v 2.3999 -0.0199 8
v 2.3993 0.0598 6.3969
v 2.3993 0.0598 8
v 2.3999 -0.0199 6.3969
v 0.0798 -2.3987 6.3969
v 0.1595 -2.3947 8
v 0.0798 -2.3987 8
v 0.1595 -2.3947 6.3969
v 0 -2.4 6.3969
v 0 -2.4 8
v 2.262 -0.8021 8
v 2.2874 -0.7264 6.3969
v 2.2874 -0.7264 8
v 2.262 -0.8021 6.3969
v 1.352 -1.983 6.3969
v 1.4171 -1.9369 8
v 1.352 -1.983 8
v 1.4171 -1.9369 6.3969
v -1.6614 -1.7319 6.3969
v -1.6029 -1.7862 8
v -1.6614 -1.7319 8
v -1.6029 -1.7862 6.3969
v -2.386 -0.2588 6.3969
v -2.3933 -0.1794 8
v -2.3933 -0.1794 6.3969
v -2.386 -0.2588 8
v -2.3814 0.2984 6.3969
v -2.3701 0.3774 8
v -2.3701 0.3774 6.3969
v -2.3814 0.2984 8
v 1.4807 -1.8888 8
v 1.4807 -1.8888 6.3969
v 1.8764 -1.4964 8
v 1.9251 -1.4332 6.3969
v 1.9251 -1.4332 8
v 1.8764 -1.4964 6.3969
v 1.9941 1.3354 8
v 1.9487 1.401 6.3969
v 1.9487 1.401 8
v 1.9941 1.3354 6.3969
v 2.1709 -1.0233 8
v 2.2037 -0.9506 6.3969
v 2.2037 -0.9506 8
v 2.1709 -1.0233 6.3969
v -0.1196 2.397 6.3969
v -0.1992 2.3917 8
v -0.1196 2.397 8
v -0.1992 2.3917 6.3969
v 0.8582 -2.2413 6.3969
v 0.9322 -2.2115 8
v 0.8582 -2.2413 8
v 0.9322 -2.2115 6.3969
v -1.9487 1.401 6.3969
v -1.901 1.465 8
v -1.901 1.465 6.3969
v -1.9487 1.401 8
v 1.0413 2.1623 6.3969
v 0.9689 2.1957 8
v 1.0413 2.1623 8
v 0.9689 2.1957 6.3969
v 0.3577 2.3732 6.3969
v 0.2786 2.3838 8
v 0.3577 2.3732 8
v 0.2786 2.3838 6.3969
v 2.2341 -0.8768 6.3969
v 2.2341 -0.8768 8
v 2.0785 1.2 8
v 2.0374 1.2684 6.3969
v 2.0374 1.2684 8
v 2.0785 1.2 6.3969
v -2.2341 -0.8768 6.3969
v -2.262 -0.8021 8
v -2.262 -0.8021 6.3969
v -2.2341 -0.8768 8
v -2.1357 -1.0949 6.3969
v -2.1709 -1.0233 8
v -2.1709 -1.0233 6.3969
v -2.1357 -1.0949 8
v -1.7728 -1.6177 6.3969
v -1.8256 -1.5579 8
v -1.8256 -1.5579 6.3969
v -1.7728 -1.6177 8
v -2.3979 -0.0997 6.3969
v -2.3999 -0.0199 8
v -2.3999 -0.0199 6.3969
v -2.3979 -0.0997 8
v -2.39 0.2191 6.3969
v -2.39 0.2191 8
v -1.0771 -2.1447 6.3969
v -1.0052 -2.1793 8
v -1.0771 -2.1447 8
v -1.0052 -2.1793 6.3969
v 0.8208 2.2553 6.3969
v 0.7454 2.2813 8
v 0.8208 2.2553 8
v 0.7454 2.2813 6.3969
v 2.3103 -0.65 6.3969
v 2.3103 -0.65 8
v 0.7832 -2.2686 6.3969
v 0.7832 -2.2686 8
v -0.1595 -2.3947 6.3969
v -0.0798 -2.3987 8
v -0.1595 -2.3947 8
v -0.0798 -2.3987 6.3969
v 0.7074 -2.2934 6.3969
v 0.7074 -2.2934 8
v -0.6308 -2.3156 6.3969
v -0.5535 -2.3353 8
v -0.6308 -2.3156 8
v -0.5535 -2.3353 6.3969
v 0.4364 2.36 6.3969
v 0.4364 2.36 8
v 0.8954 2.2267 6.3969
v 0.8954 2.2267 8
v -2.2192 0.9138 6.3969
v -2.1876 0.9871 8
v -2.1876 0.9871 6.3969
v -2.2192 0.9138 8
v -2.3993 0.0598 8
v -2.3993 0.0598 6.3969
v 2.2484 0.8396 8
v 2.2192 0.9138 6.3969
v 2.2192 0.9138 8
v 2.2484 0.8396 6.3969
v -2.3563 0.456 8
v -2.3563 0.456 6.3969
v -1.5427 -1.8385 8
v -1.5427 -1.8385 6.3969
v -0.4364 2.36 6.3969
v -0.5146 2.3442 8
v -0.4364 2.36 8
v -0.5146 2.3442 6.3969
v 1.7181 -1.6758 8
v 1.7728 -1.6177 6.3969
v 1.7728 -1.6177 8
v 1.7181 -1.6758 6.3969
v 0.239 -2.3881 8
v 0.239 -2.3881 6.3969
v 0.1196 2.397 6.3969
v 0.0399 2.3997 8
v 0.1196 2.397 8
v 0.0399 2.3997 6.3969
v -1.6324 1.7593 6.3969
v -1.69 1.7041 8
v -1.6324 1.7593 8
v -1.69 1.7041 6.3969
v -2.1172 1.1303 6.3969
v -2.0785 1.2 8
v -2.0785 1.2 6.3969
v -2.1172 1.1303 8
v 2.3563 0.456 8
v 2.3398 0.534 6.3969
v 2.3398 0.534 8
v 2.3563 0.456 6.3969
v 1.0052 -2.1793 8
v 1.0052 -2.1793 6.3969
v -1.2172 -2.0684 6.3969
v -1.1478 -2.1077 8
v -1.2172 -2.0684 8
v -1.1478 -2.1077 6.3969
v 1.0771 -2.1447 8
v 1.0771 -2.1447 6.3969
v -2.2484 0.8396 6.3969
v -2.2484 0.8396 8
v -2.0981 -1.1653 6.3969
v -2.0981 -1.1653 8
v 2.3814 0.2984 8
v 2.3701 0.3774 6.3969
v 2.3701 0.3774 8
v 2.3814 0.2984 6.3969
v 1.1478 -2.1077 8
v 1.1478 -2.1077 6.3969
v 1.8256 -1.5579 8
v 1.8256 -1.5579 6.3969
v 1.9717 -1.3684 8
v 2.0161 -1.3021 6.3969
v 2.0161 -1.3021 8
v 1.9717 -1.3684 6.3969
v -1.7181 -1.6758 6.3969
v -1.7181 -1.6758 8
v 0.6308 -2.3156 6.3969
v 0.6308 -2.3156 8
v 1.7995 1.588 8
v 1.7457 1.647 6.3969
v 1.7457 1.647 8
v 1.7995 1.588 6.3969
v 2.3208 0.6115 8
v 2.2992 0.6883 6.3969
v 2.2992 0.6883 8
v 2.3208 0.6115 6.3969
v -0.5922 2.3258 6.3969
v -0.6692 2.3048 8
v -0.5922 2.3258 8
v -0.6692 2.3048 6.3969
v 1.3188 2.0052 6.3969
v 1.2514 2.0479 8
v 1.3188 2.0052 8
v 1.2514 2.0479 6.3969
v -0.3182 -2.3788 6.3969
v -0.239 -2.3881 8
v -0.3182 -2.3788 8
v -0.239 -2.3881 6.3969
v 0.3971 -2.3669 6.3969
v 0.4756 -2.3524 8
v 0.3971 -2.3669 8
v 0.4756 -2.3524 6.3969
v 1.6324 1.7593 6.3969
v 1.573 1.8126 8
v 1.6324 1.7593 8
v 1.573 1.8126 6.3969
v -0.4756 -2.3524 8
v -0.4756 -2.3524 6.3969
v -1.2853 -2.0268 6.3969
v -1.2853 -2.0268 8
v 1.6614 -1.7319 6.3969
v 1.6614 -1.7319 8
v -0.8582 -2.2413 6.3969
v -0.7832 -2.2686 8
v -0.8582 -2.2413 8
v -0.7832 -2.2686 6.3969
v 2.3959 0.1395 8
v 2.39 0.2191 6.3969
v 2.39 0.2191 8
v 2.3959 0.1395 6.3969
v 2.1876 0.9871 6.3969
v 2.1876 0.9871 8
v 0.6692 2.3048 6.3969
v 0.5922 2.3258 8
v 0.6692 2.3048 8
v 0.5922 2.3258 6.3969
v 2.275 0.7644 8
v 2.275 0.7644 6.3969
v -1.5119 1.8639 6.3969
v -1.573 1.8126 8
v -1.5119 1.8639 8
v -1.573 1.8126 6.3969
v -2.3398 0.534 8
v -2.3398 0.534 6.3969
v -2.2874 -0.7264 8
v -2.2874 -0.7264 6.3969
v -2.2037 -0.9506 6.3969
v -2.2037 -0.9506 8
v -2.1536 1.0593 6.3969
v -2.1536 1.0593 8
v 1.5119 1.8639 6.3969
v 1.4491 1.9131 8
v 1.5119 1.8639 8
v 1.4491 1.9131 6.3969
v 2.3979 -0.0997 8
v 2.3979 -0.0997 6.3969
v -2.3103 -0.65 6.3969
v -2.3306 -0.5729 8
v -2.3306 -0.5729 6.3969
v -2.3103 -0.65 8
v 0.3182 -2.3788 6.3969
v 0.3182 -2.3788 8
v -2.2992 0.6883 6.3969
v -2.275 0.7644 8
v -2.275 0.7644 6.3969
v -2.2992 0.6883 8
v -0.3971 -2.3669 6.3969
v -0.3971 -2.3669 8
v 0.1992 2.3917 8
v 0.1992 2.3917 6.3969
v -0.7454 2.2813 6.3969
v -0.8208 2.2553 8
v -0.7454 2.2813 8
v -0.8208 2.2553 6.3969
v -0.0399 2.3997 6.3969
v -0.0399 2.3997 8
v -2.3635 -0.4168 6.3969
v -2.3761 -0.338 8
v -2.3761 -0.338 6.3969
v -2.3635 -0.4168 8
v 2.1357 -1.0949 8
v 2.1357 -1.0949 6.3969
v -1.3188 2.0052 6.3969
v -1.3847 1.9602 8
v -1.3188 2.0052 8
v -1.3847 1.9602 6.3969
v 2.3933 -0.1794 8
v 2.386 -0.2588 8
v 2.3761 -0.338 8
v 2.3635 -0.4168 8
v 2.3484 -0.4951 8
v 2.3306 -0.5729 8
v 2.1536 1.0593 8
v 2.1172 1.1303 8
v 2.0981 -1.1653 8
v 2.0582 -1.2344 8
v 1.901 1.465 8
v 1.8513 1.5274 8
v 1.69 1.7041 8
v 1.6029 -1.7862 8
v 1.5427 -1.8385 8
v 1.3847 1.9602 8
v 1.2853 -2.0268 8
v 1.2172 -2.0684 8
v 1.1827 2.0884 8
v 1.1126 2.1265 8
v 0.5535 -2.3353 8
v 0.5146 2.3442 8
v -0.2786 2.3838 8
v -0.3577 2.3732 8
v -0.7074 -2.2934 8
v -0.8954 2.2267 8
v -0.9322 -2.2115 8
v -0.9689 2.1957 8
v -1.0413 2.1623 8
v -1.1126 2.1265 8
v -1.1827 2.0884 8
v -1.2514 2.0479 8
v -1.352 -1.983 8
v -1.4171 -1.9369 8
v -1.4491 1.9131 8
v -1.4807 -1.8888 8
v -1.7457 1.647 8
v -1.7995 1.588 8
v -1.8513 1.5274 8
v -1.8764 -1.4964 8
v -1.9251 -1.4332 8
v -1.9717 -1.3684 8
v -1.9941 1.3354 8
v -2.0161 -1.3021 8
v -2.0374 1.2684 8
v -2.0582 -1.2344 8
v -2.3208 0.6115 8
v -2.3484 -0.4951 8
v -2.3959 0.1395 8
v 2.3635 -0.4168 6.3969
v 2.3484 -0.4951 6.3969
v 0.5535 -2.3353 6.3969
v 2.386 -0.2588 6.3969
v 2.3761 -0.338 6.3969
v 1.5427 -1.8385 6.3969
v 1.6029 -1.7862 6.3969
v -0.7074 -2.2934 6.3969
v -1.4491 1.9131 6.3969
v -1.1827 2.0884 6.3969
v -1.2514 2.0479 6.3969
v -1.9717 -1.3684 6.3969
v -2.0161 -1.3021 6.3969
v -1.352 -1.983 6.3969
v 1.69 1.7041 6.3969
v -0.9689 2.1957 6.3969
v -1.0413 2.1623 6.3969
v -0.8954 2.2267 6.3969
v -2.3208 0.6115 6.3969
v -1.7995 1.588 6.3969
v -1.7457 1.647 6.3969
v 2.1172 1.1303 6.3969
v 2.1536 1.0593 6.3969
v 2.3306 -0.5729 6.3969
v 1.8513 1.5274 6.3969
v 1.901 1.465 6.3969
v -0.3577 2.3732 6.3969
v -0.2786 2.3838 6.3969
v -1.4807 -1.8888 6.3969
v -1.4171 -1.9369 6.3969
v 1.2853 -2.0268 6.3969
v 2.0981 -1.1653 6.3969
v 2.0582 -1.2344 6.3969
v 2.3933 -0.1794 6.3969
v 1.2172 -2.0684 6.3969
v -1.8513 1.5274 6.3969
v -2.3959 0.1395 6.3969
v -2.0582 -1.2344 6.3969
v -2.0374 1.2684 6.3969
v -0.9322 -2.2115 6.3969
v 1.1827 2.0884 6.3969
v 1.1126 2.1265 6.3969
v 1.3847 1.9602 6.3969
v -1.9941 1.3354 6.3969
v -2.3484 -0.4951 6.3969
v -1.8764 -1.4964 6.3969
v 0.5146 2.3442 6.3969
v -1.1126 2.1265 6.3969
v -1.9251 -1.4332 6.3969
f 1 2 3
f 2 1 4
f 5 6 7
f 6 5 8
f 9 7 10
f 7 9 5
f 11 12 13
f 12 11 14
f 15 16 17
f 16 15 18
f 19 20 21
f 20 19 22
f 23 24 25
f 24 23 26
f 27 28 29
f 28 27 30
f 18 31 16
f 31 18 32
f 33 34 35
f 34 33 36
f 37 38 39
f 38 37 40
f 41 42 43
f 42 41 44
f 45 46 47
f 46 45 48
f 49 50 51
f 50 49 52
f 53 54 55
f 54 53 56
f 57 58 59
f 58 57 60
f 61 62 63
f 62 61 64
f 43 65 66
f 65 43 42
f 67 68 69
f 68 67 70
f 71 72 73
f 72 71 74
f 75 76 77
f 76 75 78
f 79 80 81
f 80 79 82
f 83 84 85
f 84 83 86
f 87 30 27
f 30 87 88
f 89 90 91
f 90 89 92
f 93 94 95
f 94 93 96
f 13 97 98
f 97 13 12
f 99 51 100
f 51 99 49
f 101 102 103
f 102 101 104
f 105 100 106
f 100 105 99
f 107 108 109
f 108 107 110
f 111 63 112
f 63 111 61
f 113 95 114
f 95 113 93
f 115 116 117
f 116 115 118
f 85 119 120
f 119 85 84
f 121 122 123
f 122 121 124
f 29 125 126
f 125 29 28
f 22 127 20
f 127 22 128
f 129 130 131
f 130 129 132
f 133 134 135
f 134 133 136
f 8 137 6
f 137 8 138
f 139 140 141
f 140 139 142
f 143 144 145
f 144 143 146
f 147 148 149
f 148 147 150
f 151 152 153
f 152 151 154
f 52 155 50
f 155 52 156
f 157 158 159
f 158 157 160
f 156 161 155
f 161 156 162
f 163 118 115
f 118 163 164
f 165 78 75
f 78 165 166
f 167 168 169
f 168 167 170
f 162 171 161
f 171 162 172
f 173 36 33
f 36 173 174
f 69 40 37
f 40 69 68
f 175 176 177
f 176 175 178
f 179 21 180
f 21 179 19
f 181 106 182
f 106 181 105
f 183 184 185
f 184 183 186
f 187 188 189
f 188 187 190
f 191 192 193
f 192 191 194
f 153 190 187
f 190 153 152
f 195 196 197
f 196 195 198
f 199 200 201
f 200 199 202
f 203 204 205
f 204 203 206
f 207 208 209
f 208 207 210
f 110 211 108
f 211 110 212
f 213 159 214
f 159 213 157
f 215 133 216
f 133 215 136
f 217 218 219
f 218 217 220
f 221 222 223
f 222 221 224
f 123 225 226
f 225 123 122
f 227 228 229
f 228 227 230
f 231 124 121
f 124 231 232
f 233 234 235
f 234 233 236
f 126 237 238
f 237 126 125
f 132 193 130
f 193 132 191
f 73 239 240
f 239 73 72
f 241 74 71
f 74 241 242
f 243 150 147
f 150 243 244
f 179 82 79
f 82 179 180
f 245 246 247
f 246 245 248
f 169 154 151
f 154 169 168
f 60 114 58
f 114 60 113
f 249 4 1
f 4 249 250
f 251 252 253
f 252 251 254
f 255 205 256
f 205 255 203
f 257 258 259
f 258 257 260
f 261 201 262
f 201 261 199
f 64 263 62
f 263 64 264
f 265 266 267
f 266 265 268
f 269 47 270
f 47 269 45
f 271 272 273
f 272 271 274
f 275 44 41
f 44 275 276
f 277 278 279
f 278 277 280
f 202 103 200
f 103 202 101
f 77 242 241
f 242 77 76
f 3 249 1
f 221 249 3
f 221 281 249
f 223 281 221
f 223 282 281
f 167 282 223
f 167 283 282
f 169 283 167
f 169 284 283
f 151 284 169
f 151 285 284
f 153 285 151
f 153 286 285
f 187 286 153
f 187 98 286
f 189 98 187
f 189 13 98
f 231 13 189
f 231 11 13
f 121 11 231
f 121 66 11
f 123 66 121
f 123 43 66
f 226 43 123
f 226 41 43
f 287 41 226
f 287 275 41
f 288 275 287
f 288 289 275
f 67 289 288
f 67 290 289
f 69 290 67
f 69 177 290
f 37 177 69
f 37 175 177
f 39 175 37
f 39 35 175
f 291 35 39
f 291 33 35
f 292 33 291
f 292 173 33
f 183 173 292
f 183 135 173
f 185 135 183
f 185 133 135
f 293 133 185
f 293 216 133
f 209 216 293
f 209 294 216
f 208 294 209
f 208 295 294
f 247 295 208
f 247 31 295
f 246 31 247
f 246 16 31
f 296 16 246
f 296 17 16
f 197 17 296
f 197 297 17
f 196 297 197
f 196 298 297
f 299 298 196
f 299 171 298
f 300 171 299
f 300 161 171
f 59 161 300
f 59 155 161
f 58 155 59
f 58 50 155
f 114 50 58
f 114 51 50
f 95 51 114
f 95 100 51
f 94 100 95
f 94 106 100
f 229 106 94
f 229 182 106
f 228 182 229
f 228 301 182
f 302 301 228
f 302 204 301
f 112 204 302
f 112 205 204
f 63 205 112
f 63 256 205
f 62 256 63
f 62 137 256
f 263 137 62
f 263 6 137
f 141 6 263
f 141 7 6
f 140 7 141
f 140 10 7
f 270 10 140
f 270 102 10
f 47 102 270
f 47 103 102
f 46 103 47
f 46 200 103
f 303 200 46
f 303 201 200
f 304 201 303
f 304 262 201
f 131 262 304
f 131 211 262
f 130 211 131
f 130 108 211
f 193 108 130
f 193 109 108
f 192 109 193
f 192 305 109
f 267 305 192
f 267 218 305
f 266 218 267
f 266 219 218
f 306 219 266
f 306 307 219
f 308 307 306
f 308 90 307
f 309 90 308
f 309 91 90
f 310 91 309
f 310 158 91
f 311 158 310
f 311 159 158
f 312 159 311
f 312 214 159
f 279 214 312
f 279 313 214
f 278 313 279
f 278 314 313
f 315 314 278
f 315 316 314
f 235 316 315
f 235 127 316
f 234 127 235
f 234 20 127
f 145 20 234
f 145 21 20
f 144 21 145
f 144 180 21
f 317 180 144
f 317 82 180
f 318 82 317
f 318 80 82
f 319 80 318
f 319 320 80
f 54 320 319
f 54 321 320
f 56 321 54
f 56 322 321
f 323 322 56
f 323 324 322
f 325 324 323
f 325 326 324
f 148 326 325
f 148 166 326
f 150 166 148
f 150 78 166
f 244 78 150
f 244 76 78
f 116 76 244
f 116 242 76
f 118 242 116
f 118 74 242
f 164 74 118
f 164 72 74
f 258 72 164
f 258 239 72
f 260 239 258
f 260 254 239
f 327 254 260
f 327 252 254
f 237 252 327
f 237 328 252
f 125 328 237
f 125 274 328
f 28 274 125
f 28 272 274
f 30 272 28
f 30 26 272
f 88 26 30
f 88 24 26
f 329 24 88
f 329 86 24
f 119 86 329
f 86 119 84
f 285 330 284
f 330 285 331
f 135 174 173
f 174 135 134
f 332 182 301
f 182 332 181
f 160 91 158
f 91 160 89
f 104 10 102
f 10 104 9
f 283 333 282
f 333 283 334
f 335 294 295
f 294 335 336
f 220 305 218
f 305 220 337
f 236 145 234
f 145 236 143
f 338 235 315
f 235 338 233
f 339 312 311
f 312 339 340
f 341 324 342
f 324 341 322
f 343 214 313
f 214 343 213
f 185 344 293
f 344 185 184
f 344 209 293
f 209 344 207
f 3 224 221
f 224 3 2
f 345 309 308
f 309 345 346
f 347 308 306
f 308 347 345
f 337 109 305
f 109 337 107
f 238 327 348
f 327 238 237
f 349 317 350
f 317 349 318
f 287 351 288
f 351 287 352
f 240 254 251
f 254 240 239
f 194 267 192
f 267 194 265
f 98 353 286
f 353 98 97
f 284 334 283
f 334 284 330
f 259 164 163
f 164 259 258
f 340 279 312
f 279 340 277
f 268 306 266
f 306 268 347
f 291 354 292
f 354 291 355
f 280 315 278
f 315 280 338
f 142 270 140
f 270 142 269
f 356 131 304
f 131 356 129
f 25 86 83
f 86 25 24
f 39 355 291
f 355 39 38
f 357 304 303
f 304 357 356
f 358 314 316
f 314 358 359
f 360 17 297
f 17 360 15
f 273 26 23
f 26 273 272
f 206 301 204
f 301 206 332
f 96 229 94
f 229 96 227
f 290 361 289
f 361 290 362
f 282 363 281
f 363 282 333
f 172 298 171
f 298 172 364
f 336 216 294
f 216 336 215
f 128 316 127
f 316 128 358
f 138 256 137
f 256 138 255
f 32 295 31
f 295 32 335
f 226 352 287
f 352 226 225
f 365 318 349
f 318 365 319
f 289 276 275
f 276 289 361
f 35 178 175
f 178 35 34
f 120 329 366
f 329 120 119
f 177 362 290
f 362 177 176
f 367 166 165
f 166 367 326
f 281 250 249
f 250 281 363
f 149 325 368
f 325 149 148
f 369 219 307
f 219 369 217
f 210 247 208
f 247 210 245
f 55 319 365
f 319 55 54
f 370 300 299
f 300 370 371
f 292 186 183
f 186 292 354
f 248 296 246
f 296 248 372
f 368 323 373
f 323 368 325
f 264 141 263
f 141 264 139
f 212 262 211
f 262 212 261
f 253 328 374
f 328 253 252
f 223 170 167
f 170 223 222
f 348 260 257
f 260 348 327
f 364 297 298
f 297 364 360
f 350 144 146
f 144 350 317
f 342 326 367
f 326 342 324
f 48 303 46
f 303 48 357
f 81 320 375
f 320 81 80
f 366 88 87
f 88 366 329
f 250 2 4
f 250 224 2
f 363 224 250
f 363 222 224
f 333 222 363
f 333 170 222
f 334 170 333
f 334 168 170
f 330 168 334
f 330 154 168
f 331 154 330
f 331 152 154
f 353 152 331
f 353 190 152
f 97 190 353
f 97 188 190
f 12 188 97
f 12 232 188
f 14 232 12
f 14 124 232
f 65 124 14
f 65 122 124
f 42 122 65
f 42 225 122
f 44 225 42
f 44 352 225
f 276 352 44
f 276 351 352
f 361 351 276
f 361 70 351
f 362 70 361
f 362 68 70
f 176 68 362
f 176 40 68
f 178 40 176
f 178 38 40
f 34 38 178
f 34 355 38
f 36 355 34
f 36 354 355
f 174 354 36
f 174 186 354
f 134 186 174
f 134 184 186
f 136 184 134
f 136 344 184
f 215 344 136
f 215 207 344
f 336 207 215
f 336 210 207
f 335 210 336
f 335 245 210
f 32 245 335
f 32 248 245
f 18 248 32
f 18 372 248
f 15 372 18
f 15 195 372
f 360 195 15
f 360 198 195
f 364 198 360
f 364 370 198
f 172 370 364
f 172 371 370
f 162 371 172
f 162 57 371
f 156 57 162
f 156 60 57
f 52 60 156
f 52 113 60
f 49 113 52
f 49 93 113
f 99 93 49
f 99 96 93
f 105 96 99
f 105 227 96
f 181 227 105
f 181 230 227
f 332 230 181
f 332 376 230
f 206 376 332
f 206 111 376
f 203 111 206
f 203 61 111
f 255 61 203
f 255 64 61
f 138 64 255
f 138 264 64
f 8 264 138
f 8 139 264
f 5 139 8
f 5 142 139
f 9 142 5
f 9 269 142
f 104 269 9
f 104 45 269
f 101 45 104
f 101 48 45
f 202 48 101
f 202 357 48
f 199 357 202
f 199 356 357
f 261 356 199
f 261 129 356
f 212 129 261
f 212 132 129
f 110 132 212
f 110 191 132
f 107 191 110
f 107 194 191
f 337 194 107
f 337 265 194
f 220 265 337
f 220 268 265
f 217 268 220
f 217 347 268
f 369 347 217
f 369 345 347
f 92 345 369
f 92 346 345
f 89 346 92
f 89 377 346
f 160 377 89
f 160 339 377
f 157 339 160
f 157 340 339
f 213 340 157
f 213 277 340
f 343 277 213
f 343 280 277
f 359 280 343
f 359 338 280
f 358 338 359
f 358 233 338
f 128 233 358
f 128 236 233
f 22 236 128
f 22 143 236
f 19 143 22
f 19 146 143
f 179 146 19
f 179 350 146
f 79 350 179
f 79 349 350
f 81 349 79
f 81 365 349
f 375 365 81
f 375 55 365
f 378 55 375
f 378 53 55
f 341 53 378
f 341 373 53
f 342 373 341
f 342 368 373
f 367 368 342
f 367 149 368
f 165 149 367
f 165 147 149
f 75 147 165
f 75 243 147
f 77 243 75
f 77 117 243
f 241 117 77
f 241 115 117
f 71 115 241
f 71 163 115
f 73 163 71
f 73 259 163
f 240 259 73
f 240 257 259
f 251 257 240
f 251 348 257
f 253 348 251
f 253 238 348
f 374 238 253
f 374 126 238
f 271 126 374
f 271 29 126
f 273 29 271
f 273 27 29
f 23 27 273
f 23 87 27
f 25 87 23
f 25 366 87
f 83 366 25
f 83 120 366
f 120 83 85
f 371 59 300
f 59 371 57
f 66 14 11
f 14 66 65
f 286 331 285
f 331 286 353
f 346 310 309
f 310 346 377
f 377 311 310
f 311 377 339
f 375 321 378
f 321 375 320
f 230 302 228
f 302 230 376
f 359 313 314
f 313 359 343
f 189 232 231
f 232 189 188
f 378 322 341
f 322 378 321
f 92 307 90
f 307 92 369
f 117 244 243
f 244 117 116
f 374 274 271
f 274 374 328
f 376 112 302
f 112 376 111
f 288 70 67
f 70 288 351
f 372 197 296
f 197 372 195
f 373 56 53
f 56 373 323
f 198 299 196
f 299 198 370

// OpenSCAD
use <../lib.scad>
use <3741c01.scad>
$fa=1; $fs=0.2;
function ldraw_lib__flowers(realsolid=false) = [
// 0 ~Moved to 3741c01
// 0 Name: flowers.dat
// 0 Author: [PTadmin]
// 0 !LDRAW_ORG Part UPDATE 2009-03
// 0 !LICENSE Licensed under CC BY 4.0 : see CAreadme.txt
// 
// 0 BFC CERTIFY CCW
  [0,"BFC","CERTIFY"],
  [0,"BFC","CCW"],
// 
// 0 !HISTORY 2009-12-29 [PTadmin] Official Update 2009-03
// 
// 
// 0 // Plant Flower Stem with Three Flowers (Complete)
// 1 16 0 0 0 1 0 0 0 1 0 0 0 1 3741c01.dat
  [1,16,0,0,0,1,0,0,0,1,0,0,0,1, ldraw_lib__3741c01(realsolid)],
];
module ldraw_lib__flowers(step=0, col=false, unit=2/5, alt=false, line=0.2, solid=!$preview)
    makepoly(ldraw_lib__flowers(solid), step=step, col=col, unit=unit, alt=alt, line=line, solid=solid);
ldraw_lib__flowers(line=0.2);
